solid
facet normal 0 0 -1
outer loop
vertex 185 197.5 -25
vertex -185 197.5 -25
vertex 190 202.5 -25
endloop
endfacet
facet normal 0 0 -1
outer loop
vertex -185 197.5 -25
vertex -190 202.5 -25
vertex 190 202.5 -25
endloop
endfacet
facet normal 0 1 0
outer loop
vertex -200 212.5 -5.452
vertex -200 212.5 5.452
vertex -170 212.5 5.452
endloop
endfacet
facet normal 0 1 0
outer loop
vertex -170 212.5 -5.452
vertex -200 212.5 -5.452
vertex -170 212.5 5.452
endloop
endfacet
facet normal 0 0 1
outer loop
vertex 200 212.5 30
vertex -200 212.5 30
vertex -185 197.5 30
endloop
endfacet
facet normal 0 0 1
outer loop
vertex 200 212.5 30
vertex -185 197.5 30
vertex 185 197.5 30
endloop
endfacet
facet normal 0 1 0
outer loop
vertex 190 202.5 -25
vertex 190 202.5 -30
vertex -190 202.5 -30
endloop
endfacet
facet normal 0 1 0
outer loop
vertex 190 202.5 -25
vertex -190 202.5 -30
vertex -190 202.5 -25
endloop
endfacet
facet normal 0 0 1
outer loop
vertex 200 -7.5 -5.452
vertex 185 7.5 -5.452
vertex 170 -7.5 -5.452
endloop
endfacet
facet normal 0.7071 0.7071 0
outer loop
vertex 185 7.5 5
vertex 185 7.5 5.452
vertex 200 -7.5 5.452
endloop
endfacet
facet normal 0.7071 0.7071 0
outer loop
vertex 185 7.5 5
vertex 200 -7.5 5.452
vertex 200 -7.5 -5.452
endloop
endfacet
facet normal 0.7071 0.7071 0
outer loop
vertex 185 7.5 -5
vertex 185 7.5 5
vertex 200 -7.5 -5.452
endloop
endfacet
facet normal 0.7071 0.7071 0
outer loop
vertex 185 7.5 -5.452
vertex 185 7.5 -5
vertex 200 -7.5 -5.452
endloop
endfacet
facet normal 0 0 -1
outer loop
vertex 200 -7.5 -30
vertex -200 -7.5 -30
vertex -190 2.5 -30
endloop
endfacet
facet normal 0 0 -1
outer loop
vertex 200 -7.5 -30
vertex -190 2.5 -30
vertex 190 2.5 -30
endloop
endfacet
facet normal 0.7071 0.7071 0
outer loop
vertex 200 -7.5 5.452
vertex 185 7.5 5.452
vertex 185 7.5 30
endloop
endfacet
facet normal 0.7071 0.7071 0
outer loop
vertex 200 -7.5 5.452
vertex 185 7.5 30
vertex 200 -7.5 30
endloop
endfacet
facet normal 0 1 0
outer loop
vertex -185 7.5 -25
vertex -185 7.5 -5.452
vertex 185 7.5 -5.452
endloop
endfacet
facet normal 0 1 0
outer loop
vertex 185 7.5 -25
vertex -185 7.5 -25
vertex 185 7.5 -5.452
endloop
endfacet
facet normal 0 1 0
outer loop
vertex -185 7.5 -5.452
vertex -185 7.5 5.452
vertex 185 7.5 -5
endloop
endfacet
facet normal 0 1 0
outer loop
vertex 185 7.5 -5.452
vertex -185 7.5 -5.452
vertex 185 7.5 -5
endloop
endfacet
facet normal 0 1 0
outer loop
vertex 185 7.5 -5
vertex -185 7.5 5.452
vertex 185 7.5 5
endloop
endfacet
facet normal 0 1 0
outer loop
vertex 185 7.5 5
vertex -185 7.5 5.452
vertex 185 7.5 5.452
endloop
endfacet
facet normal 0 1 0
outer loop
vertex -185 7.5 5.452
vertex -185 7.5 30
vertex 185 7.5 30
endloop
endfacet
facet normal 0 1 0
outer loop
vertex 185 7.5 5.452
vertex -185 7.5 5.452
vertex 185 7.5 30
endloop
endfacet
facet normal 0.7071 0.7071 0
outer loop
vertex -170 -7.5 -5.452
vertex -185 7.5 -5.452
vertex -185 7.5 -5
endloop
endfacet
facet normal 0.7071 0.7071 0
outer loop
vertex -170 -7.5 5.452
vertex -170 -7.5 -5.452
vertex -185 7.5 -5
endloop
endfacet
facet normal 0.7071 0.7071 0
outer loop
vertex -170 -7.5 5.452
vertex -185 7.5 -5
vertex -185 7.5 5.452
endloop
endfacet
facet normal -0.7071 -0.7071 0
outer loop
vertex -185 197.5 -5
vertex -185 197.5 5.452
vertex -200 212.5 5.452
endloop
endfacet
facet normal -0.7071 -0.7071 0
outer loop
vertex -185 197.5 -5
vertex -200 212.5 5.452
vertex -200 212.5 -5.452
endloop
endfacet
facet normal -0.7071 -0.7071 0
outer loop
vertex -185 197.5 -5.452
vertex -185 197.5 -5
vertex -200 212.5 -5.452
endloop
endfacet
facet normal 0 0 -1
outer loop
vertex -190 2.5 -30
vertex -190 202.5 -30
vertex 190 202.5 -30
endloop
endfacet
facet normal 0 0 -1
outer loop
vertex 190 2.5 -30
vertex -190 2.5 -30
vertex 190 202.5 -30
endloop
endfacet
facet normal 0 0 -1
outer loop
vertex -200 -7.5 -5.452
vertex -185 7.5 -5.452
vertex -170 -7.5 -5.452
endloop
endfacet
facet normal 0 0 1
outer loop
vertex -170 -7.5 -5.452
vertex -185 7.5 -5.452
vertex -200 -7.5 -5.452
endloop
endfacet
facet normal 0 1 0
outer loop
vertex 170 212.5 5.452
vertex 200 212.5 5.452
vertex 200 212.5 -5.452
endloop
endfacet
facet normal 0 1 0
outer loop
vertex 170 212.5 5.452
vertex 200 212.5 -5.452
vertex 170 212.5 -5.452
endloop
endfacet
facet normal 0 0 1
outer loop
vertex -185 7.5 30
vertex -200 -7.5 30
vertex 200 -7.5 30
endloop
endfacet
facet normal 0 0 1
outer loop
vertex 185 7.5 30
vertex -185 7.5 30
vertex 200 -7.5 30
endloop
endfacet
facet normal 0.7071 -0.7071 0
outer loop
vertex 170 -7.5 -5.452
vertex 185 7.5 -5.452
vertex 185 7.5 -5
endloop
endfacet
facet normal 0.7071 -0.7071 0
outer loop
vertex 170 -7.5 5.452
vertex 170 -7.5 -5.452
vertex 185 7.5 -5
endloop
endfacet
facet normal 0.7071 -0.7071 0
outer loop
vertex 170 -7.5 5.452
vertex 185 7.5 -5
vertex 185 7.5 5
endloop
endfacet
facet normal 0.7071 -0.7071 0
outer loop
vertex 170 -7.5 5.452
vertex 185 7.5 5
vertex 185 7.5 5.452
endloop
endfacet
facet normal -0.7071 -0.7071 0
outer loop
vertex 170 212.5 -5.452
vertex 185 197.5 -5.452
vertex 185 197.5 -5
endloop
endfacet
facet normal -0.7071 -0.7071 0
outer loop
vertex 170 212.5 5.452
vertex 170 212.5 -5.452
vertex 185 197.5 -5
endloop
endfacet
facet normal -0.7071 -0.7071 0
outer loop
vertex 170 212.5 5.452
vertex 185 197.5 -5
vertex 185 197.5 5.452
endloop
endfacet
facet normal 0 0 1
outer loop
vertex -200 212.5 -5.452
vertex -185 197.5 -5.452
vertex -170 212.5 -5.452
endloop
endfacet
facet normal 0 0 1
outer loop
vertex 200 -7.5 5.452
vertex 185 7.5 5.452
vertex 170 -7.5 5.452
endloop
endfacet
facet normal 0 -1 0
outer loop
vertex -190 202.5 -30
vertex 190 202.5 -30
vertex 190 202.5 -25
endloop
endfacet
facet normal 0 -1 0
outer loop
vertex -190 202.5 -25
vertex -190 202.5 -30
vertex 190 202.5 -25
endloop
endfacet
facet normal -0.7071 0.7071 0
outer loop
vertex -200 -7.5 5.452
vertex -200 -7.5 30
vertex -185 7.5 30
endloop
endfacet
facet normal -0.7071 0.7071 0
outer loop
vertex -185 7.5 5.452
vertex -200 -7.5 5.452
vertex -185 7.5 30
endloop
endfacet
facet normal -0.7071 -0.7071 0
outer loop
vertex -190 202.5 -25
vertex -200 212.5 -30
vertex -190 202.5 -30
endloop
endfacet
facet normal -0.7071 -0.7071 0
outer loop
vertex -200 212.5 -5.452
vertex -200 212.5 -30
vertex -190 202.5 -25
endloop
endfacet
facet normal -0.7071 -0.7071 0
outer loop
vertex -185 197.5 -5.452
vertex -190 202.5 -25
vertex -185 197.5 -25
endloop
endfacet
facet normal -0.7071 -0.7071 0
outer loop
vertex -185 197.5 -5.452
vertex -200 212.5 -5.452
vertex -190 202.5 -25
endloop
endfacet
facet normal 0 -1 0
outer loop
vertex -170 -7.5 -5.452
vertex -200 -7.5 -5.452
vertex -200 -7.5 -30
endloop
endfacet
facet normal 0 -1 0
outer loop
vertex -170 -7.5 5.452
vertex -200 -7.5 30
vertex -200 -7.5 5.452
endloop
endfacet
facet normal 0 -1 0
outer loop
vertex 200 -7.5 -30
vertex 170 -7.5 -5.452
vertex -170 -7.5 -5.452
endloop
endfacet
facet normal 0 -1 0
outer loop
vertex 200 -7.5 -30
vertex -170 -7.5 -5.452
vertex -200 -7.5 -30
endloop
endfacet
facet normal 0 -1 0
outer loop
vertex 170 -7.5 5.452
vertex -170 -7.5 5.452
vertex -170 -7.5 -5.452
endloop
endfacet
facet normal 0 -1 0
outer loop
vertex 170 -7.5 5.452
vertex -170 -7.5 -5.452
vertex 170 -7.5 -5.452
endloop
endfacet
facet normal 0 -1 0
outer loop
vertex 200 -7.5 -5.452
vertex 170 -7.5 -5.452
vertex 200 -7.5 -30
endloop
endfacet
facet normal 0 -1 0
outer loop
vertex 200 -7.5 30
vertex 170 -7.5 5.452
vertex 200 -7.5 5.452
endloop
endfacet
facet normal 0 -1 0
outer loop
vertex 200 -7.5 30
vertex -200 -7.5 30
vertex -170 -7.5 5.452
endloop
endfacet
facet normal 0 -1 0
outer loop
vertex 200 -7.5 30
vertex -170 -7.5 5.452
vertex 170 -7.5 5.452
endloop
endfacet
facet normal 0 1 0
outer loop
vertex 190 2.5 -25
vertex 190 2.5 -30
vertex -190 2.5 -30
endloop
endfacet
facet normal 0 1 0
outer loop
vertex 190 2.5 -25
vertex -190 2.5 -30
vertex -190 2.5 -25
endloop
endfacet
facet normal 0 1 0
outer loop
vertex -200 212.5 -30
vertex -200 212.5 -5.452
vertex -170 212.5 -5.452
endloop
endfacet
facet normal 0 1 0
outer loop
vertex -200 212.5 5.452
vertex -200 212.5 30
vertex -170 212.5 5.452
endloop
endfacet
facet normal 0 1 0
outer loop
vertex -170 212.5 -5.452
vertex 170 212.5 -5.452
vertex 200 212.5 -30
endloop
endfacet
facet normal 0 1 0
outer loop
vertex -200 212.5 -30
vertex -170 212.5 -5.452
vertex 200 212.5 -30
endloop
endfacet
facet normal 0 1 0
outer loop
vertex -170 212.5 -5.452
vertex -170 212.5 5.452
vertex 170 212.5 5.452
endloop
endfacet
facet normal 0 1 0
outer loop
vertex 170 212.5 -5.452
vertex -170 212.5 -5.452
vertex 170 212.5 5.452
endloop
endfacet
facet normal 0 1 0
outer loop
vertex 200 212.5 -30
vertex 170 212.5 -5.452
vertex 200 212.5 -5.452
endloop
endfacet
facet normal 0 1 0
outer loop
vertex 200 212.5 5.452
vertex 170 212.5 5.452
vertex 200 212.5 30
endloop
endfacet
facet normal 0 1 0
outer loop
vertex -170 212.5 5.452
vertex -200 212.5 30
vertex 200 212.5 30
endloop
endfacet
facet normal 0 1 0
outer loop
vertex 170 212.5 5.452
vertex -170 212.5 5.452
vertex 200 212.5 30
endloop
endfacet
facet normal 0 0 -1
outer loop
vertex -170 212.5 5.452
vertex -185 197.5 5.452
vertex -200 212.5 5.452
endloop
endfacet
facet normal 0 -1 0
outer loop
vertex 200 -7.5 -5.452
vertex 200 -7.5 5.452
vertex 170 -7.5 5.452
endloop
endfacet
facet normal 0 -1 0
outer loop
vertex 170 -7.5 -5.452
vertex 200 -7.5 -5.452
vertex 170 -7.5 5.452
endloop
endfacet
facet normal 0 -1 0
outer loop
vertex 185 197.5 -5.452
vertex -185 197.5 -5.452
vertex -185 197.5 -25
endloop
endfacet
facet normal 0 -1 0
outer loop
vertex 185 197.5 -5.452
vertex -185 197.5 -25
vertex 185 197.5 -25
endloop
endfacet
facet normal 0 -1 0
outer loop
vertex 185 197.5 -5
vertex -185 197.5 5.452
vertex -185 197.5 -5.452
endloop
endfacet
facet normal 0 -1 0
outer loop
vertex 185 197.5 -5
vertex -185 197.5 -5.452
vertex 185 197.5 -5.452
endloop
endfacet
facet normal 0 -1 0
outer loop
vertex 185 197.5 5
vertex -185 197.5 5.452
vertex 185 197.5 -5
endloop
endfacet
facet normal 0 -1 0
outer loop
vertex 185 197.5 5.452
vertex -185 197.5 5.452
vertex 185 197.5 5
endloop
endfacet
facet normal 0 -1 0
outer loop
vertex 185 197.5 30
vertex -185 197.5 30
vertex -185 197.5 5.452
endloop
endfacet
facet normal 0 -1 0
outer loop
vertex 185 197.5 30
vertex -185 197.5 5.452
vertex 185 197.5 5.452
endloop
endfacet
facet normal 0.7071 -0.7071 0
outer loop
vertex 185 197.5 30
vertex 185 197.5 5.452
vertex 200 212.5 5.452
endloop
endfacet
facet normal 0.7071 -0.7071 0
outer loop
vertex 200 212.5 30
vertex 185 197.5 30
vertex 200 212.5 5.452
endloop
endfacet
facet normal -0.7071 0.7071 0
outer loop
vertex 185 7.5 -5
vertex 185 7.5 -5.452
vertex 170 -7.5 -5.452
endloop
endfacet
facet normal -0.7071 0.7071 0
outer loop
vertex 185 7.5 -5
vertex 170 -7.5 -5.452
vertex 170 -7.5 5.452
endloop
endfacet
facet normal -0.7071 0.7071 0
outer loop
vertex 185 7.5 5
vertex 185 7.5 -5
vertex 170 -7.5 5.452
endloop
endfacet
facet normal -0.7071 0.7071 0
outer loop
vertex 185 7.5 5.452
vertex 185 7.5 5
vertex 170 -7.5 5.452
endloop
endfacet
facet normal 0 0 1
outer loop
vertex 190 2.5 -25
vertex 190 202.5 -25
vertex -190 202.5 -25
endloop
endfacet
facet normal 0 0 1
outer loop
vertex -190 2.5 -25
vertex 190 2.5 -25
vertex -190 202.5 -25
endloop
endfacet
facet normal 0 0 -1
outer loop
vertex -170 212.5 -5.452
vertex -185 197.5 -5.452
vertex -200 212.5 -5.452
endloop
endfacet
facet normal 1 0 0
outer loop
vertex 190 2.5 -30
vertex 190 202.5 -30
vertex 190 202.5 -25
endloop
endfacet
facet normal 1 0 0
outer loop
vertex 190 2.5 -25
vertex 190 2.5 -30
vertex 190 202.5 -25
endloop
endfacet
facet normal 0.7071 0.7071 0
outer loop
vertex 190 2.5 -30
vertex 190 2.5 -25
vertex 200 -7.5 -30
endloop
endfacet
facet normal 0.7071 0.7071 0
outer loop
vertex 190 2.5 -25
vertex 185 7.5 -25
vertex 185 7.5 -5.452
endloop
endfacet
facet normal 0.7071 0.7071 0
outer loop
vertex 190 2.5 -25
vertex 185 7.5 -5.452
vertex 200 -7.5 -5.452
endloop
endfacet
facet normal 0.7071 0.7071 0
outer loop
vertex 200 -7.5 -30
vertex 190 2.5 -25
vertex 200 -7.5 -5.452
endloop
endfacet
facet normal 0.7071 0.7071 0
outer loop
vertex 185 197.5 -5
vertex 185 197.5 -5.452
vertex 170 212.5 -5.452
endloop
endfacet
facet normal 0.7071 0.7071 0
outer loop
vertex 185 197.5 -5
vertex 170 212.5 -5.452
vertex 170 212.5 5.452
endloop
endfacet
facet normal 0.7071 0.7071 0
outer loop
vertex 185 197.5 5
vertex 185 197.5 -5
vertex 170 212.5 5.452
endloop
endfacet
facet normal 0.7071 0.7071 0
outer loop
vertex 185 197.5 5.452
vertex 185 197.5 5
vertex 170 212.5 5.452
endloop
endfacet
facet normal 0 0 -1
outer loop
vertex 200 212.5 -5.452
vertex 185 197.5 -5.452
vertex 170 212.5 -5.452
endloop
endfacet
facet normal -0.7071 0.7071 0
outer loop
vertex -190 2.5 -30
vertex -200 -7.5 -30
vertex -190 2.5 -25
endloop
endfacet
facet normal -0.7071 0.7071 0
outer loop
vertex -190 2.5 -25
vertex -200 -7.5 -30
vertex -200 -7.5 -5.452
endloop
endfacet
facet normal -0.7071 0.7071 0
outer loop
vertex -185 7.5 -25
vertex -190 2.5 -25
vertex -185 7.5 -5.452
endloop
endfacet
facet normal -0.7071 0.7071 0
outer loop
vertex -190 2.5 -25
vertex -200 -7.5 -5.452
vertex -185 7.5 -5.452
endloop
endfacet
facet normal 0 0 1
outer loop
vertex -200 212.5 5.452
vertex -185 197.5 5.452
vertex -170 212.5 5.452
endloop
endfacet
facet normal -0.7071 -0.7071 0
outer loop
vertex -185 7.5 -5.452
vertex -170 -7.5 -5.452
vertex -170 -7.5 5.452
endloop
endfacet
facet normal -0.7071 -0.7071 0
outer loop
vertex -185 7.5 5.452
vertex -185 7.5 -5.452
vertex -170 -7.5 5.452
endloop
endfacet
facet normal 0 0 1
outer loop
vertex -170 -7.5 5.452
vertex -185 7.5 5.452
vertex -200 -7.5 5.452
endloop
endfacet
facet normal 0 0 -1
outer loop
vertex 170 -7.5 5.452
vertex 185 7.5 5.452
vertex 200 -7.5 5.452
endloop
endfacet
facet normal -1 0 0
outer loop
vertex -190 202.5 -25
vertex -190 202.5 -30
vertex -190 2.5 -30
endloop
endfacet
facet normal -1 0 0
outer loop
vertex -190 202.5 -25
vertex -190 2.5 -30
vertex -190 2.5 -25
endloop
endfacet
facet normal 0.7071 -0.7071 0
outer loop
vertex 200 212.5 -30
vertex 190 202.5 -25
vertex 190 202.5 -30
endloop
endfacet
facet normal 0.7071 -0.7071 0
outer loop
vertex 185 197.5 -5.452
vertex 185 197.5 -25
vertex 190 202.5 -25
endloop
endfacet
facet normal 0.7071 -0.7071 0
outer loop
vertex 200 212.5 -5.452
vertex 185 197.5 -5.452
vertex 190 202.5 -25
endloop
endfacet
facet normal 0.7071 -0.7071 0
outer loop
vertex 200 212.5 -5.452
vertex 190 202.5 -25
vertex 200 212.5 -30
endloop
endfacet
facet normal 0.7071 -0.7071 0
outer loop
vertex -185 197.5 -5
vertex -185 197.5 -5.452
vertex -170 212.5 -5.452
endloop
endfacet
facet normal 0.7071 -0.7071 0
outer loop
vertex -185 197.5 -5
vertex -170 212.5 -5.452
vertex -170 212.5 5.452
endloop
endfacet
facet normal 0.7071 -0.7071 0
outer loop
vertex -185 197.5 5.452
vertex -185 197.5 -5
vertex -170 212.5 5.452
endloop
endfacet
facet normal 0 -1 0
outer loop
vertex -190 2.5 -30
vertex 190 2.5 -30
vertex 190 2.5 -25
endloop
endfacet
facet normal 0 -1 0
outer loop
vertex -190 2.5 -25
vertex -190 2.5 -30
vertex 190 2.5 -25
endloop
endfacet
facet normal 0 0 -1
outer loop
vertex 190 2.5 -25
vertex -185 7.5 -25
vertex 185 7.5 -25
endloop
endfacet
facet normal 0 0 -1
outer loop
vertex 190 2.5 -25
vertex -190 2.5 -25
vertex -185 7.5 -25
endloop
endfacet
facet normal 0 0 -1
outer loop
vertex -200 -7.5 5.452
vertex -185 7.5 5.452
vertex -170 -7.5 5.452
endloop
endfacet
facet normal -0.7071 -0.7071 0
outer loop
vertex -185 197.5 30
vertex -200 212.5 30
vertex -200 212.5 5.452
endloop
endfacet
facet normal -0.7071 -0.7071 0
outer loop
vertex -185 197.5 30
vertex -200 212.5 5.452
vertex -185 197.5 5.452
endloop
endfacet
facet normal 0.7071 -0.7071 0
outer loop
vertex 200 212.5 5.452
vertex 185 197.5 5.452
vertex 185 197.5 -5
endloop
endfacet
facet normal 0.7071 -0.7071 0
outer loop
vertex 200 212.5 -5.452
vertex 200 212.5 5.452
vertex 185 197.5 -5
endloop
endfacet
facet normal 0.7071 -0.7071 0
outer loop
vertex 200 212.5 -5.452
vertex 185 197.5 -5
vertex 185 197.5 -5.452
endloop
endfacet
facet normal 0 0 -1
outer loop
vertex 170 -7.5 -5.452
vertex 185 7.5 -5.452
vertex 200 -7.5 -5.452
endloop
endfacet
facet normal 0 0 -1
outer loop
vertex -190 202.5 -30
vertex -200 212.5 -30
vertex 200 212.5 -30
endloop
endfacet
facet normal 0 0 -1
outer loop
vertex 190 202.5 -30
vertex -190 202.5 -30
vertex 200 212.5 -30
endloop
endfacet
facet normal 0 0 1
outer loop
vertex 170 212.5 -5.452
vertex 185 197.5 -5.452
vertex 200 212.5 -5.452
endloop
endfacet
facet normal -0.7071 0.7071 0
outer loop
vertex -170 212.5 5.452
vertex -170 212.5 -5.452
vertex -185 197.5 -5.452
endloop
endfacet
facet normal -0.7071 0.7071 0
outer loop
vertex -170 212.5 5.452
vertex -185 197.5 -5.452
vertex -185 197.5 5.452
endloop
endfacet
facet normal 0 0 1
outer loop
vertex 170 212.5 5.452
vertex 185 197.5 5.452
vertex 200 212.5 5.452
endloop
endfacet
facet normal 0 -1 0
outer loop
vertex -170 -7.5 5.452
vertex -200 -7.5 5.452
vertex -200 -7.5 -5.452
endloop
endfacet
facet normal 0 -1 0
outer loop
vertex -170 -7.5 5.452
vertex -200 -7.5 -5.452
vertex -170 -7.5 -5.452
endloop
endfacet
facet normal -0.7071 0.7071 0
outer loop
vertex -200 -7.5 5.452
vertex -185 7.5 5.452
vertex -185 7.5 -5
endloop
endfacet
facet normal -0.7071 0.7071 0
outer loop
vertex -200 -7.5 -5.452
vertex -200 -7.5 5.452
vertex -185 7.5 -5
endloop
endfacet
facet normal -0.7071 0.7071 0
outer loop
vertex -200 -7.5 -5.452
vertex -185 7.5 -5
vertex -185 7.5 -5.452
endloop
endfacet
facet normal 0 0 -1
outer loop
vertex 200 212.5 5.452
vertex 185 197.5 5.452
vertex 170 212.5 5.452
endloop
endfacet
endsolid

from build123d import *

# Parameters (mm, degrees)
F0_W      = 400
F0_H      = 60
F1_DEPTH  = 7.5
F3_DEPTH  = 60
F4_W      = 21.2132034356
F4_H      = 10
F5_DEPTH  = 25
F6_W      = 21.2132034356
F6_H      = 10.9041733667
F7_DEPTH  = 25
F8_W      = 320
F8_H      = 50
F9_DEPTH  = 25
F10_W     = 320
F10_H     = 5
F11_DEPTH = 5
F12_W     = 5
F12_H     = 5
F13_DEPTH = 50
F15_DEPTH = 100
F17_DEPTH = 25
F19_DEPTH = 25
F23_DEPTH = 50
F24_DEPTH = 50


with BuildPart() as f1:
    # F0 (on Front) → F1 (new body, symmetric)
    with BuildSketch(Plane.XZ):
        Rectangle(F0_W, F0_H)
    extrude(amount=F1_DEPTH, both=True)

    # F2 (on face) → F3 (cut)
    with BuildSketch(Plane.XY.offset(30)):
        Polygon((-200, 7.5), (-200, -7.5), (-185, 7.5), align=None)
        Polygon((185, 7.5), (200, -7.5), (200, 7.5), align=None)
    extrude(amount=-F3_DEPTH, mode=Mode.SUBTRACT)

    # F4 (on face) → F5 (cut)
    with BuildSketch(Plane(origin=(96.25, 96.25, 0), x_dir=(-0.7071067812, 0.7071067812, 0), z_dir=(0.7071067812, 0.7071067812, 0))):
        with Locations((-136.1180553784, 0)):
            Rectangle(F4_W, F4_H)
    extrude(amount=-F5_DEPTH, mode=Mode.SUBTRACT)

    # F6 (on face) → F7 (cut)
    with BuildSketch(Plane(origin=(-96.25, 96.25, 0), x_dir=(-0.7071067812, -0.7071067812, 0), z_dir=(-0.7071067812, 0.7071067812, 0))):
        with Locations((136.1180553784, 0)):
            Rectangle(F6_W, F6_H)
    extrude(amount=-F7_DEPTH, mode=Mode.SUBTRACT)

    # F8 (on face) → F9 (cut)
    with BuildSketch(Plane.XZ.offset(7.5)):
        Rectangle(F8_W, F8_H)
    extrude(amount=-F9_DEPTH, mode=Mode.SUBTRACT)

    # F10 (on face) → F11 (cut)
    with BuildSketch(Plane(origin=(0, 7.5, 0), x_dir=(-1, 0, 0), z_dir=(0, 1, 0))):
        with Locations((0, -27.5)):
            Rectangle(F10_W, F10_H)
    extrude(amount=-F11_DEPTH, mode=Mode.SUBTRACT)

    # F12 (on face) → F13 (cut)
    with BuildSketch(Plane.YZ.offset(-160)):
        with Locations((5, -27.5)):
            Rectangle(F12_W, F12_H)
    extrude(amount=-F13_DEPTH, mode=Mode.SUBTRACT)

    # F14: F1 across plane


with BuildPart() as f1_1:
    add(f1.part)
    add(f1.part.mirror(Plane.YZ), mode=Mode.INTERSECT)


with BuildPart() as f15:
    # F15 (new): a face of the model
    f15_faces = [f1_1.part.faces().sort_by_distance(p)[0] for p in [
        (0, 2.5, -27.5),
    ]]
    extrude(f15_faces, amount=F15_DEPTH)

    # F20: F15 across plane


with BuildPart() as f17:
    # F17 (new): a face of the model
    f17_faces = [f1_1.part.faces().sort_by_distance(p)[0] for p in [
        (177.5, 0, 0),
    ]]
    extrude(f17_faces, amount=F17_DEPTH)

    # F18 (on face) → F19 (cut)
    with BuildSketch(Plane.XY.offset(5.4520866834)):
        Polygon((200, -7.5), (170, -7.5), (187.6776695297, -25.1776695297), (202.6776695297, -10.1776695297), align=None)
    extrude(amount=-F19_DEPTH, mode=Mode.SUBTRACT)


with BuildPart() as f15_1:
    add(f15.part)
    add(f15.part.mirror(Plane(origin=(0, 102.5, -27.5), x_dir=(-1, 0, 0), z_dir=(0, 1, 0))))


with BuildPart() as f21_1:
    # F21: instance of F17
    add(f17.part.mirror(Plane.YZ))


with BuildPart() as f22_1:
    # F22: instance of F1
    add(f1_1.part.mirror(Plane(origin=(0, 102.5, -27.5), x_dir=(-1, 0, 0), z_dir=(0, 1, 0))))

    # F23 (add): a face of the model
    f23_faces = [f22_1.faces().sort_by_distance(p)[0] for p in [
        (0, 205, 25),
    ]]
    extrude(f23_faces, amount=F23_DEPTH)


with BuildPart() as f22_2:
    # F22: instance of F21_1
    add(f21_1.part.mirror(Plane(origin=(0, 102.5, -27.5), x_dir=(-1, 0, 0), z_dir=(0, 1, 0))))


with BuildPart() as f22_3:
    # F22: instance of F17
    add(f17.part.mirror(Plane(origin=(0, 102.5, -27.5), x_dir=(-1, 0, 0), z_dir=(0, 1, 0))))


with BuildPart() as f1_2:
    add(f1_1.part)

    # F24 (add): a face of the model
    f24_faces = [f1_2.faces().sort_by_distance(p)[0] for p in [
        (0, 0, 25),
    ]]
    extrude(f24_faces, amount=F24_DEPTH)


solid = Compound([f17.part, f15_1.part, f21_1.part, f22_1.part, f22_2.part, f22_3.part, f1_2.part])
